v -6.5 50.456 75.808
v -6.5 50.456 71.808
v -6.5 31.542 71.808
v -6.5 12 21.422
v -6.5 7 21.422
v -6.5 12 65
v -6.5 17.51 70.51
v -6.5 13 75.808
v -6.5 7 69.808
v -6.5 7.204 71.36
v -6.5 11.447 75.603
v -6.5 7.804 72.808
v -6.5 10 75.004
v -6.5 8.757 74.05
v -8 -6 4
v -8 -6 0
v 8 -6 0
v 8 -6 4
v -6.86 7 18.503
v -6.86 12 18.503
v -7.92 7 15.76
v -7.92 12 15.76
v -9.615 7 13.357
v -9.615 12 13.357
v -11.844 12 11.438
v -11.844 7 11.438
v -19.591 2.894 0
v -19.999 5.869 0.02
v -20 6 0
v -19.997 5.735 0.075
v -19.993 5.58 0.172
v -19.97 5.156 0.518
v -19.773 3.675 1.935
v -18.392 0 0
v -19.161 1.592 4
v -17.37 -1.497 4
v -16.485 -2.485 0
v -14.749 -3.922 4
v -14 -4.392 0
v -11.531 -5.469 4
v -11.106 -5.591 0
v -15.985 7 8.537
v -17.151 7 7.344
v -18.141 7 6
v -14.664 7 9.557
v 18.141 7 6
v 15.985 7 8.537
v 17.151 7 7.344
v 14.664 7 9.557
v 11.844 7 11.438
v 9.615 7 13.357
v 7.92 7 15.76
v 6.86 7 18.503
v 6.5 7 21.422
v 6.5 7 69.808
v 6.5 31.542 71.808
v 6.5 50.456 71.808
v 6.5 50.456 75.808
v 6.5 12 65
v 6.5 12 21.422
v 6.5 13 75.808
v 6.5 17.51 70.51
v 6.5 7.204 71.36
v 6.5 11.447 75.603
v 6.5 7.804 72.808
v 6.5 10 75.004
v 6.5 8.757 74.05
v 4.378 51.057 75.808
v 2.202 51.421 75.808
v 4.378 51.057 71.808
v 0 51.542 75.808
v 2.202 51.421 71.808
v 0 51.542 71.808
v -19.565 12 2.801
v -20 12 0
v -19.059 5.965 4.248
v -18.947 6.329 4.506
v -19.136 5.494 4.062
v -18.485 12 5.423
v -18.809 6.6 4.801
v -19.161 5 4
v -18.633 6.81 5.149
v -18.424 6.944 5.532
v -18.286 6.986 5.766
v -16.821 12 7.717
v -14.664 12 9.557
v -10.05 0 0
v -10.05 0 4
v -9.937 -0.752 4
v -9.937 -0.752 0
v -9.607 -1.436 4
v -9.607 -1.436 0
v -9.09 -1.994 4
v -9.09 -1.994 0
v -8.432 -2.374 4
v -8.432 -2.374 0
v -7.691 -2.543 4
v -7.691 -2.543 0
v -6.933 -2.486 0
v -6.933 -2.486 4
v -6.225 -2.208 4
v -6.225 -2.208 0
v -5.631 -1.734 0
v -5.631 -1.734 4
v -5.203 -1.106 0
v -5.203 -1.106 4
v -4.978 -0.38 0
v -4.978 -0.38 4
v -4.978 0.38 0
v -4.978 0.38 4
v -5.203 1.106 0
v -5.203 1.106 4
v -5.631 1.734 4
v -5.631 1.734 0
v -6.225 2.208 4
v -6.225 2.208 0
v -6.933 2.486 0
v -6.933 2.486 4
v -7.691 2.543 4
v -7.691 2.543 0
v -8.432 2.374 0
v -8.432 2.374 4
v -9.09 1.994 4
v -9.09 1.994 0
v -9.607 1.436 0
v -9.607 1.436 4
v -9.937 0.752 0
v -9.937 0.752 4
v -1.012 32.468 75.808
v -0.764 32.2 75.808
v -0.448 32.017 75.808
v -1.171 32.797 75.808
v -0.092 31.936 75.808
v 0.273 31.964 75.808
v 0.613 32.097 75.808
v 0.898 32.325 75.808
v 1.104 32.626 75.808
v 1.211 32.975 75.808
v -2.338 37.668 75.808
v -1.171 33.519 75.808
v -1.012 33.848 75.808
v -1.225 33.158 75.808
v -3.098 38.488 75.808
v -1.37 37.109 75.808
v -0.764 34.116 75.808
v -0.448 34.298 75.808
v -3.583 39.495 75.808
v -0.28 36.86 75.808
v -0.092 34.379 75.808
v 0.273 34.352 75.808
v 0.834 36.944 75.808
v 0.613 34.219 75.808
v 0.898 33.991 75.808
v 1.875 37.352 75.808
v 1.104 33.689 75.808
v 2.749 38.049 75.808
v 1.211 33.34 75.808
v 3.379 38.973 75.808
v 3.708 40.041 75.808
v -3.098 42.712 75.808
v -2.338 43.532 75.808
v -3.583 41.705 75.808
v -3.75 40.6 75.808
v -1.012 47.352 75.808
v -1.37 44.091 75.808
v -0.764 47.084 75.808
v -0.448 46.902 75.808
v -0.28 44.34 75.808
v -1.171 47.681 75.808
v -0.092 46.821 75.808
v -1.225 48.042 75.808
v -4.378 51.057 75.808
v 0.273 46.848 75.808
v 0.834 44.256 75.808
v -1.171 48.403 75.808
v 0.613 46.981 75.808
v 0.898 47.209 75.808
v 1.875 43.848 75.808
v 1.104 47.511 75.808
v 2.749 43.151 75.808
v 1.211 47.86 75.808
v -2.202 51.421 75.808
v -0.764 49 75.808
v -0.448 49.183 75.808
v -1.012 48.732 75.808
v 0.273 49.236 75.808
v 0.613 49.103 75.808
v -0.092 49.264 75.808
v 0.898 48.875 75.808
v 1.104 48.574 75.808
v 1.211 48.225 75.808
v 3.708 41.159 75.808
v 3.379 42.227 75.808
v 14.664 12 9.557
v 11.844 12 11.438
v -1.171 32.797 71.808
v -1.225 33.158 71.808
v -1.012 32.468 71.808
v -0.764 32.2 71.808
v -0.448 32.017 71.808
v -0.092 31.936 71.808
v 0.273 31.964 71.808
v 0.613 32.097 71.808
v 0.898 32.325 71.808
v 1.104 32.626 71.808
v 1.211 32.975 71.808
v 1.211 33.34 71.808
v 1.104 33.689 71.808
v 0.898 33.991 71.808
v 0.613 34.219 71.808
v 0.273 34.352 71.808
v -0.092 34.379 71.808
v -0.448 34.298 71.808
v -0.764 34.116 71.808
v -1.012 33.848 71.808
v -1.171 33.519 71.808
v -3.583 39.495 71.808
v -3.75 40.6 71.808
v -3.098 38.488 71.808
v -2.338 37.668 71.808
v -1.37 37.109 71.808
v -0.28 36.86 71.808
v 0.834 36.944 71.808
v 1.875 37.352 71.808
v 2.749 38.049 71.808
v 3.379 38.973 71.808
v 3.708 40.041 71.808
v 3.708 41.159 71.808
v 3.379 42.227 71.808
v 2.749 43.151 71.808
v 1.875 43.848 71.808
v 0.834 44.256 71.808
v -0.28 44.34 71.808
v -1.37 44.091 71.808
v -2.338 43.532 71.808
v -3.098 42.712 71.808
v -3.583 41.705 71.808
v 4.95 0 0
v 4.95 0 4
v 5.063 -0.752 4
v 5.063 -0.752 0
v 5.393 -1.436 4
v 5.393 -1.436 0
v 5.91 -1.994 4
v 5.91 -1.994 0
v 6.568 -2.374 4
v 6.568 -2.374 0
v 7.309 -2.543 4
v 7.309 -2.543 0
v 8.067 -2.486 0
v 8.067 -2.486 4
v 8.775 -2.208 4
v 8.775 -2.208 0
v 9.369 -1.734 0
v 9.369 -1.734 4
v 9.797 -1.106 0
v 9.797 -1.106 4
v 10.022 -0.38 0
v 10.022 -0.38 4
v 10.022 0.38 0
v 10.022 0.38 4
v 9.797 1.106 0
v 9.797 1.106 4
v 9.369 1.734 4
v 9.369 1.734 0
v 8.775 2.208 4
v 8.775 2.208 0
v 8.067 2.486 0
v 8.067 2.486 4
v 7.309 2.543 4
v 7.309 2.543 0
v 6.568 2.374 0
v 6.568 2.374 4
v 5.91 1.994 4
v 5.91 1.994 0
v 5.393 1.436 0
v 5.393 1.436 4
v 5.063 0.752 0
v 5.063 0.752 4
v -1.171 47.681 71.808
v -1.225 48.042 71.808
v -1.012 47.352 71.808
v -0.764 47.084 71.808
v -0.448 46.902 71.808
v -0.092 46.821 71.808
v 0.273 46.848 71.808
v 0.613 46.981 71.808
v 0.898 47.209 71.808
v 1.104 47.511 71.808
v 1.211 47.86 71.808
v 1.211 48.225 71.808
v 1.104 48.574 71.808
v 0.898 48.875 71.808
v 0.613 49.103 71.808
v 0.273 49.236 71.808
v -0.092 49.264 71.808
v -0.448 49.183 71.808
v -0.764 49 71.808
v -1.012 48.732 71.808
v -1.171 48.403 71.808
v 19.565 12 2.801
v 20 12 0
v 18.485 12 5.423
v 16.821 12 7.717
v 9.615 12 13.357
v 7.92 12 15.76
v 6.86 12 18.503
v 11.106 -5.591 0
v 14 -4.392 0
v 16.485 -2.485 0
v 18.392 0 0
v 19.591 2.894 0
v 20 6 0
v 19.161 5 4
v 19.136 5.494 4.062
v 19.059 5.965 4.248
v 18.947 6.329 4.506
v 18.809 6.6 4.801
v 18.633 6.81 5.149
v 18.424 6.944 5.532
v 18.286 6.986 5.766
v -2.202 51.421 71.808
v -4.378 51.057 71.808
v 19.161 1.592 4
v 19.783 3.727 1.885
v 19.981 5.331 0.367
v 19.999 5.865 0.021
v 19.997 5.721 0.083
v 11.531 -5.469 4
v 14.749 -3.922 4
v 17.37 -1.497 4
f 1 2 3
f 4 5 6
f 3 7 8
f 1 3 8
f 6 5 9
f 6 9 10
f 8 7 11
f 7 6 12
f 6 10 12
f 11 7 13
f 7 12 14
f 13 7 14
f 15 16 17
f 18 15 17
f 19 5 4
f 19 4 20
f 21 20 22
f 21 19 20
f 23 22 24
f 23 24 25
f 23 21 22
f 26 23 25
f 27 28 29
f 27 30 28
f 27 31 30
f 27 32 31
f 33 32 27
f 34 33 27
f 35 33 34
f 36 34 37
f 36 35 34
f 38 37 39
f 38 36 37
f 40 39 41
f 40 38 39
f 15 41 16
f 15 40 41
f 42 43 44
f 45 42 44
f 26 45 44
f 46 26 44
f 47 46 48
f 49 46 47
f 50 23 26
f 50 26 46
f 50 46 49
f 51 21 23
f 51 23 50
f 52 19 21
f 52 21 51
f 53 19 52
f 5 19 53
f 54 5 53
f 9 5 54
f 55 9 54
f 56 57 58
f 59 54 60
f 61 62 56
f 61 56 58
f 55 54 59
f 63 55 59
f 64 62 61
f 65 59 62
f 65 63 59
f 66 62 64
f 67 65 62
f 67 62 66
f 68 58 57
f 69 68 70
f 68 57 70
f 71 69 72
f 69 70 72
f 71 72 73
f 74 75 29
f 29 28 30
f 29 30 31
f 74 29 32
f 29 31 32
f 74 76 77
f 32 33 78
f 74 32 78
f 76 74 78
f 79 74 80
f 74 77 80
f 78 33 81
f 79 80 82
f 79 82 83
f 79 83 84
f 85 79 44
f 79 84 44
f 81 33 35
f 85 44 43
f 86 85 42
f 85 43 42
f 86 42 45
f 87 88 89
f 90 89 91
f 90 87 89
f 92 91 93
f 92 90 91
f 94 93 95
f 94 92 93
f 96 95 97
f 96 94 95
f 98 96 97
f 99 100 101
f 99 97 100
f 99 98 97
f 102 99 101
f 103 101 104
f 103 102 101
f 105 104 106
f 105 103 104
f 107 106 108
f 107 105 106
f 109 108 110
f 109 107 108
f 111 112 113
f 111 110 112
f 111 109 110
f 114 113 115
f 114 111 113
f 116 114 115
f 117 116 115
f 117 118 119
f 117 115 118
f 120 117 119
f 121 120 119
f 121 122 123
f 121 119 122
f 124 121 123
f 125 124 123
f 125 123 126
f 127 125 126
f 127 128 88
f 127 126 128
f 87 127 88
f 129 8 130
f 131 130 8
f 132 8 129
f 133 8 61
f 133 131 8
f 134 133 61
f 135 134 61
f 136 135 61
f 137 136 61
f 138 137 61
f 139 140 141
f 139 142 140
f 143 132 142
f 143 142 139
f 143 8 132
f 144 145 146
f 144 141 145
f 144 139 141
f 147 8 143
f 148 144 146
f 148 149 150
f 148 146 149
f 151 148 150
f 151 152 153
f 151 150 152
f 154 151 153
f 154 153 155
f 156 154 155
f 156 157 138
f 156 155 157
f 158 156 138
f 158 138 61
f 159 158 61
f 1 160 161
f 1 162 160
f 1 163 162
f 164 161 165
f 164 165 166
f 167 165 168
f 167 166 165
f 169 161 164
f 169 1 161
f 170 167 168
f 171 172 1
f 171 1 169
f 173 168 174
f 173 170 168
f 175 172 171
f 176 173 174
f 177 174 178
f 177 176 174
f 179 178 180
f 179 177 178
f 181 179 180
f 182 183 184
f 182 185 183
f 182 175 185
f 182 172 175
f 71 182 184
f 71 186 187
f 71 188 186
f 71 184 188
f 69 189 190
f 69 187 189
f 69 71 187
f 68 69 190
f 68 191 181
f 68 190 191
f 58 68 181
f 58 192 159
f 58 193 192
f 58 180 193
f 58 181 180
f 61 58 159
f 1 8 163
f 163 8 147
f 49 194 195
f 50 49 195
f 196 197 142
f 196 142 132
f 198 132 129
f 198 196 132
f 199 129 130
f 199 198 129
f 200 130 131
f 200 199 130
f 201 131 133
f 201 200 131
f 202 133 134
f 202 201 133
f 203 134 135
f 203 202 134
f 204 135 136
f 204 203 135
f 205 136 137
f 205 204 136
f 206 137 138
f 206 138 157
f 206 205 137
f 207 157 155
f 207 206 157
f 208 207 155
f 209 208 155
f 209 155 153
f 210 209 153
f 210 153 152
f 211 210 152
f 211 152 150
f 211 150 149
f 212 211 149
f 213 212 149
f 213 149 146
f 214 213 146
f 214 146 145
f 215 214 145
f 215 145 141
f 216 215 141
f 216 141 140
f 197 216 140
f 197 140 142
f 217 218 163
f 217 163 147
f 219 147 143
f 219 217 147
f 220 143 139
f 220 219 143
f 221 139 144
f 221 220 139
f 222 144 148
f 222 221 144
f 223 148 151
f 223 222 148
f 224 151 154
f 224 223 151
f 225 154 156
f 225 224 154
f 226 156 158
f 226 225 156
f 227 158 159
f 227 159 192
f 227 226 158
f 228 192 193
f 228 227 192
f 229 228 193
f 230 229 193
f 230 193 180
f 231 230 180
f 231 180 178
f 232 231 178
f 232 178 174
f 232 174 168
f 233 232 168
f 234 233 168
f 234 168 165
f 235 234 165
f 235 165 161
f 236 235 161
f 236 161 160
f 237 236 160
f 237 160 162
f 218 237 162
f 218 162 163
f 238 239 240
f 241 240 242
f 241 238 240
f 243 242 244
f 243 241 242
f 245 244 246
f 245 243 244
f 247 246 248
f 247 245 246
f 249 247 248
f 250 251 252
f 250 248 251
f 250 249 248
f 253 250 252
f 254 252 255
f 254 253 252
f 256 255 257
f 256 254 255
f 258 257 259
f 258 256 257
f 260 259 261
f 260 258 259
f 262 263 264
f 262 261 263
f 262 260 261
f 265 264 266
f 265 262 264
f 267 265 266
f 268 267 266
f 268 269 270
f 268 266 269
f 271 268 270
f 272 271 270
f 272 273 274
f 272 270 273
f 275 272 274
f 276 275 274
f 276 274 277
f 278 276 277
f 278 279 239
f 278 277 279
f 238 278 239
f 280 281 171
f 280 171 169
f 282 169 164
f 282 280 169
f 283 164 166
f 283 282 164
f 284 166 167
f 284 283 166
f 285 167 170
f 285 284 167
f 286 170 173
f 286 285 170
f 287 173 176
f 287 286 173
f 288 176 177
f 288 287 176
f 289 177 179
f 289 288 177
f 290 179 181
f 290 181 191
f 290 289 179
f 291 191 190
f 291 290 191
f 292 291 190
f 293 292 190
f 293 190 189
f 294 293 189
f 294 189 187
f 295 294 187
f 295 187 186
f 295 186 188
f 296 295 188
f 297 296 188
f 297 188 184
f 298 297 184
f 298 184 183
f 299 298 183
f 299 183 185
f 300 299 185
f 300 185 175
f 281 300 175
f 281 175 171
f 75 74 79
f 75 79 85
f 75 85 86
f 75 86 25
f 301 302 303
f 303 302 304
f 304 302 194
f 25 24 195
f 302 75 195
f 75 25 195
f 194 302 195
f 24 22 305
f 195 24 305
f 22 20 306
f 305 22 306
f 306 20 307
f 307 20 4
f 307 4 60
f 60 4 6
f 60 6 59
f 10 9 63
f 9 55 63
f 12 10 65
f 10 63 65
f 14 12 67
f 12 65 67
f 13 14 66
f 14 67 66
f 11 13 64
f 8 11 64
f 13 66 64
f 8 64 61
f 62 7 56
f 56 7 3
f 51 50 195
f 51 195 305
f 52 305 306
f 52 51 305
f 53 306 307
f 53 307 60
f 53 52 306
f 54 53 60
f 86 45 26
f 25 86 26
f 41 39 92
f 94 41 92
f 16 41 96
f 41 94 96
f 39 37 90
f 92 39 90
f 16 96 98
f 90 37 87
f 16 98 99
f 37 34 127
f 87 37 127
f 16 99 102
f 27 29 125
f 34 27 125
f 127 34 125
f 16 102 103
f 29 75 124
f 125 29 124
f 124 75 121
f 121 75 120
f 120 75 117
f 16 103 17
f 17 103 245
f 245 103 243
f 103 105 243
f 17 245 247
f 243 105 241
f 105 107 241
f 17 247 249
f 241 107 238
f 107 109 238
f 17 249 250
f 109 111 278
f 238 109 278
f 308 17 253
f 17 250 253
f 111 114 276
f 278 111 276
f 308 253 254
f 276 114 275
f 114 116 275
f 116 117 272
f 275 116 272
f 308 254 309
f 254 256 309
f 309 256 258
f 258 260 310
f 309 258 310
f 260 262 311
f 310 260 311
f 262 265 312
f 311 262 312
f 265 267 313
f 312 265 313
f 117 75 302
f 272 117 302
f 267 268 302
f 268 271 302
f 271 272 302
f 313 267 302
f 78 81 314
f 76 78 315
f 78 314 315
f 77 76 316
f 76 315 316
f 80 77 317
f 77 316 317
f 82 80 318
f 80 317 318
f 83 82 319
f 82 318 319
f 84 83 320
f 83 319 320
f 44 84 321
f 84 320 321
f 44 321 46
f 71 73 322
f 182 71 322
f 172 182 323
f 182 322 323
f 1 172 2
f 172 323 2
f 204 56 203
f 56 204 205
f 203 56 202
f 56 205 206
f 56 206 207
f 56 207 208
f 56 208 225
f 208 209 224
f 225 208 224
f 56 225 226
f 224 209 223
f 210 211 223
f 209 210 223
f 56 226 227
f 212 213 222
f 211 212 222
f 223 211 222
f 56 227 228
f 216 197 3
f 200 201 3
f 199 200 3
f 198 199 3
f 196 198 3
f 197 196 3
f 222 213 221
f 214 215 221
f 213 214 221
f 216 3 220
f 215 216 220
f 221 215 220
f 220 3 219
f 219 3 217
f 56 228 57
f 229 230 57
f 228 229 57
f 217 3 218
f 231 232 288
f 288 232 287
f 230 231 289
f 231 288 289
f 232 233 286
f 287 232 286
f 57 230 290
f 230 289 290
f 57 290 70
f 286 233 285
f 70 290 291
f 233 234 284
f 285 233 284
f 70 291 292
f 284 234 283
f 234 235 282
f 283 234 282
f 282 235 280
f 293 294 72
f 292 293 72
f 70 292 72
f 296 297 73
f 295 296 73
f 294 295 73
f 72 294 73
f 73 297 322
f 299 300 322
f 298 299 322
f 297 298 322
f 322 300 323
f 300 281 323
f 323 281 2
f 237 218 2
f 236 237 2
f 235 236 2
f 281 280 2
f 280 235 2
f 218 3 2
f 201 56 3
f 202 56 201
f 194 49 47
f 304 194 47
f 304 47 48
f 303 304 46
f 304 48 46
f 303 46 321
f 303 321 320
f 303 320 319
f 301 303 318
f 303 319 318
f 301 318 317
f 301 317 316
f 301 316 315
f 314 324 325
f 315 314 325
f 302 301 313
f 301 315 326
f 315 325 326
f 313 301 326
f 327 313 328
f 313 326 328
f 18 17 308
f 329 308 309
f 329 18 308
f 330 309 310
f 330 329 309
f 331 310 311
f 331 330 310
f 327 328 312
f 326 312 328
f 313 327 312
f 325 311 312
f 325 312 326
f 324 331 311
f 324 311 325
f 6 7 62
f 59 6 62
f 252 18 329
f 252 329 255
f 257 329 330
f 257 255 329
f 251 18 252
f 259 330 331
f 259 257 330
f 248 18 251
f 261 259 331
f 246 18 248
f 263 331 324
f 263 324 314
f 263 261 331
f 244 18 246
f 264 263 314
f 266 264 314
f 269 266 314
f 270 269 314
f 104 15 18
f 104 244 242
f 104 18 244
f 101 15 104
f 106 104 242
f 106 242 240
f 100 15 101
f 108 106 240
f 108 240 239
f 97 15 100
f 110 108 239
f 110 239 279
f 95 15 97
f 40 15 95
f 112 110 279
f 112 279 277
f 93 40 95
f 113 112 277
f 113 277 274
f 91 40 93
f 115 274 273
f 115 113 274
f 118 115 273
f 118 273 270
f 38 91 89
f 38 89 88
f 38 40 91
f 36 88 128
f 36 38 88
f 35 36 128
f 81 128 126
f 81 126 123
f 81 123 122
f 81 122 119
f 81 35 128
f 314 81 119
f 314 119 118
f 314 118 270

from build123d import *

# Parameters (mm, degrees)
CROQUIS2_R              = 2.55
CROQUIS2_R_2            = 3.75
CROQUIS2_R_3            = 1.225
SALIENTE_EXTRUIR1_DEPTH = 75.8075
CORTAR_EXTRUIR1_DEPTH   = 101.016875761
CROQUIS5_W              = 71.8075
CROQUIS5_H              = 13
CORTAR_EXTRUIR2_DEPTH   = 101.016875761
REDONDEO1_R             = 2
CHAFL_N1_SIZE           = 5
CHAFL_N1_SIZE2          = 5.533110727
REDONDEO2_R             = 12
CORTAR_EXTRUIR3_DEPTH   = 91.170863593
REDONDEO3_R             = 12
REDONDEO4_R             = 6


with BuildPart() as part:
    # Croquis2 → Saliente-Extruir1 (new body)
    with BuildSketch(Plane.XY):
        with BuildLine():
            Line((-20, 31.5422), (-20, -6))
            Line((-20, -6), (20, -6))
            Line((20, -6), (20, 31.5422))
            ThreePointArc((20, 31.5422), (14.142135624, 45.684335624), (0, 51.5422))
            ThreePointArc((0, 51.5422), (-14.142135624, 45.684335624), (-20, 31.5422))
        make_face()
        with Locations(Location((-7.5, 0, 0), (0, 0, 180))):
            Circle(CROQUIS2_R, mode=Mode.SUBTRACT)
        with Locations(Location((7.5, 0, 0), (0, 0, 180))):
            Circle(CROQUIS2_R, mode=Mode.SUBTRACT)
        with Locations(Location((0, 40.6, 0), (0, 0, 180))):
            Circle(CROQUIS2_R_2, mode=Mode.SUBTRACT)
        with Locations(Location((0, 48.0422, 0), (0, 0, 180))):
            Circle(CROQUIS2_R_3, mode=Mode.SUBTRACT)
        with Locations(Location((0, 33.1578, 0), (0, 0, 180))):
            Circle(CROQUIS2_R_3, mode=Mode.SUBTRACT)
    extrude(amount=SALIENTE_EXTRUIR1_DEPTH)

    # Croquis4 → Cortar-Extruir1 (cut, through all)
    with BuildSketch(Plane.ZY.offset(20)):
        Polygon((0, 12), (70, 12), (71.8075, 31.5422), (71.8075, 53.713147715), (0, 53.713147715), align=None)
    extrude(amount=-CORTAR_EXTRUIR1_DEPTH, mode=Mode.SUBTRACT)

    # Croquis5 → Cortar-Extruir2 (cut, through all)
    with BuildSketch(Plane.ZY.offset(20)):
        with Locations((39.90375, 0.5)):
            Rectangle(CROQUIS5_W, CROQUIS5_H)
    extrude(amount=-CORTAR_EXTRUIR2_DEPTH, mode=Mode.SUBTRACT)

    # Redondeo1
    redondeo1_edges = [part.edges().sort_by_distance(p)[0] for p in [
        (0, 7, 4),
    ]]
    fillet(redondeo1_edges, radius=REDONDEO1_R)

    # Chaflán1
    chafl_n1_edges = [part.edges().sort_by_distance(p)[0] for p in [
        (0, 12, 70),
    ]]
    chafl_n1_side = [part.faces().sort_by_distance(p)[0] for p in [
        (0, 12, 35),
    ]]
    chamfer(chafl_n1_edges, length=CHAFL_N1_SIZE, length2=CHAFL_N1_SIZE2, reference=chafl_n1_side[0])

    # Redondeo2
    redondeo2_edges = [part.edges().sort_by_distance(p)[0] for p in [
        (20, -6, 2),
        (-20, -6, 2),
    ]]
    fillet(redondeo2_edges, radius=REDONDEO2_R)

    # Croquis7 → Cortar-Extruir3 (cut, through all)
    with BuildSketch(Plane.XZ.offset(-7)):
        Polygon((-20, 6), (-6.5, 15), (-6.5, 75.8075), (-20, 75.8075), align=None)
        Polygon((20, 75.8075), (20, 6), (6.5, 15), (6.5, 75.8075), align=None)
    extrude(amount=-CORTAR_EXTRUIR3_DEPTH, mode=Mode.SUBTRACT)

    # Redondeo3
    # the kernel refuses this fillet: 12 mm, written as the material it adds along each edge
    with BuildSketch(Plane(origin=(-6.5, 7, 15), x_dir=(-0.8320502943378436, 0, -0.5547001962252291), z_dir=(0, 1, 0)), Plane(origin=(6.5, 7, 15), x_dir=(0, 0, 1), z_dir=(0, 1, 0))) as redondeo3_piece_1:
        with BuildLine():
            CenterArc((REDONDEO3_R * 0.535183758488, REDONDEO3_R), REDONDEO3_R, 213.690067526, 56.309932474)
            Line((-REDONDEO3_R * 0.29686653585, REDONDEO3_R * 0.445299803775), (0, 0))
            Line((0, 0), (REDONDEO3_R * 0.535183758488, 0))
        make_face()
    extrude(amount=5)
    # the kernel refuses this fillet: 12 mm, written as the material it takes off along each edge
    with BuildSketch(Plane(origin=(20, -9.032649504, 6), x_dir=(0, 0, -1), z_dir=(0, 1, 0))) as redondeo3_2_piece_1:
        with BuildLine():
            CenterArc((6.427278002, 11.99239065), REDONDEO3_R, 213.690067526, 54.269398965)
            Line((-3.55732553, 5.335988296), (0, 0))
            Line((0, 0), (6, 0))
        make_face()
    extrude(amount=37.065299008, mode=Mode.SUBTRACT)
    with BuildSketch(Plane(origin=(-20, -9.032649504, 6), x_dir=(0, 0, -1), z_dir=(0, 1, 0))) as redondeo3_2_piece_2:
        with BuildLine():
            CenterArc((6.427278002, -11.99239065), REDONDEO3_R, 92.040533509, 54.269398965)
            Line((-3.55732553, -5.335988296), (0, 0))
            Line((0, 0), (6, 0))
        make_face()
    extrude(amount=37.065299008, mode=Mode.SUBTRACT)

    # Redondeo4
    redondeo4_edges = [part.edges().sort_by_distance(p)[0] for p in [
        (0, 7, 75.8075),
    ]]
    fillet(redondeo4_edges, radius=REDONDEO4_R)


solid = part.part
